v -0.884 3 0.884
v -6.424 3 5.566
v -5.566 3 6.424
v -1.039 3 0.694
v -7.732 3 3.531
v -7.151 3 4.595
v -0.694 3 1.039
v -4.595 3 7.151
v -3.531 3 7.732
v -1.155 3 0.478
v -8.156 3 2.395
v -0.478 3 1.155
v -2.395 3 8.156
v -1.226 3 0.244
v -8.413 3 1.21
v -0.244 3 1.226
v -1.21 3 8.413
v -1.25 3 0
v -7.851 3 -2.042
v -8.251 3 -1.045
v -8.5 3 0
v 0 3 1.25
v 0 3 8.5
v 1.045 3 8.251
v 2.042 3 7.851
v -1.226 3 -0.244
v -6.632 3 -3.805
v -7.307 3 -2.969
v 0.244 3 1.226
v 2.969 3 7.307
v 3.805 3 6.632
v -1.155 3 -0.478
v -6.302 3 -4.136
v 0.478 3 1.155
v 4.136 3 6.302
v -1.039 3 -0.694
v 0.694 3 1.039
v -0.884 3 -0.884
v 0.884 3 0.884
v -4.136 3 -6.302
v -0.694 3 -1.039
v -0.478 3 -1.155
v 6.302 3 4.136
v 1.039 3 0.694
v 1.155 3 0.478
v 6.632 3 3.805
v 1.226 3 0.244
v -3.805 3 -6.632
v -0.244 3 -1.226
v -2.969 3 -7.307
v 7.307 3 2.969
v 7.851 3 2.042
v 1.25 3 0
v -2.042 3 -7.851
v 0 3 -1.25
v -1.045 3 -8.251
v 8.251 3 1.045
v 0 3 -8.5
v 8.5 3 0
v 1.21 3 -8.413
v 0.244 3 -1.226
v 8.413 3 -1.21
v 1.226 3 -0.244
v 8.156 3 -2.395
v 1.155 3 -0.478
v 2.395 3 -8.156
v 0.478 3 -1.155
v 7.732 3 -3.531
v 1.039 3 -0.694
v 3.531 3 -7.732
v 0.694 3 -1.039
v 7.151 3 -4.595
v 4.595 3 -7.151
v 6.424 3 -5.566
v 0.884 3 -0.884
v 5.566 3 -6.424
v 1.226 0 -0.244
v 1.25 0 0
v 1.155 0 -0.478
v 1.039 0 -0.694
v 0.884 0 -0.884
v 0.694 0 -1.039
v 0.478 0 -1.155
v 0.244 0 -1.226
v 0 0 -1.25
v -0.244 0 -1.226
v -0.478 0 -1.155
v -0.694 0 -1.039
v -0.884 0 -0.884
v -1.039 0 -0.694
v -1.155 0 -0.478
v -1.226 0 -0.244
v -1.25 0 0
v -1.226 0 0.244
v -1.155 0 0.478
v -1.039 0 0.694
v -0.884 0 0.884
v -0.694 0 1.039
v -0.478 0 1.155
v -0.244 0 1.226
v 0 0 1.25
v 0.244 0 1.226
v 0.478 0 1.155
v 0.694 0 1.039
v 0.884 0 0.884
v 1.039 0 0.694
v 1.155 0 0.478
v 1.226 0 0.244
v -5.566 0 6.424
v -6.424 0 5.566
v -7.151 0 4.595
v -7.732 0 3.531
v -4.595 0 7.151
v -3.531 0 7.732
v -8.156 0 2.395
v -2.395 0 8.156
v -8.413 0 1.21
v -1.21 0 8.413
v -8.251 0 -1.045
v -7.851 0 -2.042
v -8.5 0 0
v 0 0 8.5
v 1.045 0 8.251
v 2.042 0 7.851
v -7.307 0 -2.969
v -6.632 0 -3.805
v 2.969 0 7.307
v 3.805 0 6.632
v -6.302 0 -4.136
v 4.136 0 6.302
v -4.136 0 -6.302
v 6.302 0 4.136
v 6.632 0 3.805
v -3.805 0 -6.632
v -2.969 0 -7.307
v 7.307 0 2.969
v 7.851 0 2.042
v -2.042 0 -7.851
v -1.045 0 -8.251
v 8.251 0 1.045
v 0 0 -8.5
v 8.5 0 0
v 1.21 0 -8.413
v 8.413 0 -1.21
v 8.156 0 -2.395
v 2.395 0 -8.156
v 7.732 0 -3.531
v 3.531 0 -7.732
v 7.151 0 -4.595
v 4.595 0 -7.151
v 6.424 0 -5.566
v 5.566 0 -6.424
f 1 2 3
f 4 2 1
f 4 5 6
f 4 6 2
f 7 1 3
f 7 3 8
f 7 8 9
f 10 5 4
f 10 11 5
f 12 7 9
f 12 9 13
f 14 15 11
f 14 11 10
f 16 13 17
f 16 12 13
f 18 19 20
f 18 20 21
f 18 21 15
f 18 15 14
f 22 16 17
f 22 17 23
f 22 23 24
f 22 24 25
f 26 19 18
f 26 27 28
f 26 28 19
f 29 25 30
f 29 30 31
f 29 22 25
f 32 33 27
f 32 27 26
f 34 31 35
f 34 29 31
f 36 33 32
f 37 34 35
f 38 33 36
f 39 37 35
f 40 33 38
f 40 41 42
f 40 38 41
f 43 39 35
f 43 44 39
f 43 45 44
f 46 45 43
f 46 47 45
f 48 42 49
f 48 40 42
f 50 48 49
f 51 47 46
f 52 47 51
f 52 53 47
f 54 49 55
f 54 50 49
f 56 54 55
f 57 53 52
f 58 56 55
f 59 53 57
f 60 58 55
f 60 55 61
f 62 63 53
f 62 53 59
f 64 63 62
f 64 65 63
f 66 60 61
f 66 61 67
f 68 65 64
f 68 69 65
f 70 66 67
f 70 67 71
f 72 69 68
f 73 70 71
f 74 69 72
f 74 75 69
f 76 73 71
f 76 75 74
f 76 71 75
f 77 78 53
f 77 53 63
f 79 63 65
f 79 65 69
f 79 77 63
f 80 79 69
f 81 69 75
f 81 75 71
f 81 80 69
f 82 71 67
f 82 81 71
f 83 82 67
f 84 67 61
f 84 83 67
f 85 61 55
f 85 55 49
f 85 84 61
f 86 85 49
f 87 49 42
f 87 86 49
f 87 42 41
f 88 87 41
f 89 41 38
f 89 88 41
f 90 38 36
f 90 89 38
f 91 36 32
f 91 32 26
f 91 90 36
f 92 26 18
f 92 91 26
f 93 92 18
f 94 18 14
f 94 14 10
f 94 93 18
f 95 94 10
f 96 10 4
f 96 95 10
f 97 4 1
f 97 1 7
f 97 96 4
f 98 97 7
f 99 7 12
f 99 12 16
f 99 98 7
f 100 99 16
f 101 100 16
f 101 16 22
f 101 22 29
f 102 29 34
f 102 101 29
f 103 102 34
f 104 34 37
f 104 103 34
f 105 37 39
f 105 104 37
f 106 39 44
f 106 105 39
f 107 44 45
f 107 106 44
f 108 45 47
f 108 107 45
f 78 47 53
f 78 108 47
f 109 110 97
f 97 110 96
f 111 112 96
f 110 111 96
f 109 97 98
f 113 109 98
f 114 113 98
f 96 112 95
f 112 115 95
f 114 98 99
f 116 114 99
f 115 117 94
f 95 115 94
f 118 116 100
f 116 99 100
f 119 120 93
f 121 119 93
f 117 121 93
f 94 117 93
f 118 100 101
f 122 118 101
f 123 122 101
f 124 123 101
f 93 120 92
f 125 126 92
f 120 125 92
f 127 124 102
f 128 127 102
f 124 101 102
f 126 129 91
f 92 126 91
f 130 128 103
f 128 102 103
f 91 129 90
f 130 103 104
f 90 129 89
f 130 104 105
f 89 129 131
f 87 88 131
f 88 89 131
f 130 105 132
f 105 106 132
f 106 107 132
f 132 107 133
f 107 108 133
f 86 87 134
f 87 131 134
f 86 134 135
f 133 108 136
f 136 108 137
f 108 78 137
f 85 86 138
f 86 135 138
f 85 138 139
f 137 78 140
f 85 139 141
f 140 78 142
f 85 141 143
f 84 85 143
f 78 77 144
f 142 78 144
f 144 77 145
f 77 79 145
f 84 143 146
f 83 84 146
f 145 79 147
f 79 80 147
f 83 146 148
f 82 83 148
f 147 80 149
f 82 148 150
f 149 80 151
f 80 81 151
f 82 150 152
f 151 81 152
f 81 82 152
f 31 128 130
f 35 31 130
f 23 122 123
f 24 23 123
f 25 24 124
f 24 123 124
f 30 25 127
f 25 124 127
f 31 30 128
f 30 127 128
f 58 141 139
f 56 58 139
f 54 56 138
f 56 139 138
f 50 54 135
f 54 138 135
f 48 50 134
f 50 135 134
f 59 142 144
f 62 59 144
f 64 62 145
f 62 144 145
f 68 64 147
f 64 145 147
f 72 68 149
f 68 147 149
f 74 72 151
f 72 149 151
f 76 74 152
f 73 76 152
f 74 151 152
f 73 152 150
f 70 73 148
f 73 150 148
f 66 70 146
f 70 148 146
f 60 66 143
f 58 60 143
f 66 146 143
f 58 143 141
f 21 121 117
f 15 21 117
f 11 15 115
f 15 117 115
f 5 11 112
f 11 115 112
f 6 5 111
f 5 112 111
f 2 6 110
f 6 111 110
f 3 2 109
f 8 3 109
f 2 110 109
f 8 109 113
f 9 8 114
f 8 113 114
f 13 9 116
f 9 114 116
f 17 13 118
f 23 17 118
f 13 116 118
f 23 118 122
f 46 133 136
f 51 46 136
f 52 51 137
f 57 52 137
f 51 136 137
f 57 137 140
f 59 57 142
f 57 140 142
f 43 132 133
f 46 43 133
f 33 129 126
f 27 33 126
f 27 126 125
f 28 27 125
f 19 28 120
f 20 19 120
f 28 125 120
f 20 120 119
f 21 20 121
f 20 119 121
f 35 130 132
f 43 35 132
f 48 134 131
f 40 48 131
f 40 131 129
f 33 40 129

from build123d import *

# Parameters (mm, degrees)
SKETCH1_R           = 1.25
BOSS_EXTRUDE1_DEPTH = 3


with BuildPart() as part:
    # Sketch1 → Boss-Extrude1 (new body)
    with BuildSketch(Plane(origin=(0, 0, 0), x_dir=(1, 0, 0), z_dir=(0, 1, 0))):
        with BuildLine():
            Line((6.30223182, -4.135535586), (6.632271605, -3.805495802))
            ThreePointArc((6.632271605, -3.805495802), (7.850711529, -2.042416999), (8.5, 0))
            ThreePointArc((8.5, 0), (6.01040764, 6.01040764), (0, 8.5))
            ThreePointArc((0, 8.5), (-2.042416999, 7.850711529), (-3.805495802, 6.632271605))
            Line((-3.805495802, 6.632271605), (-4.135535586, 6.30223182))
            Line((-4.135535586, 6.30223182), (-6.30223182, 4.135535586))
            Line((-6.30223182, 4.135535586), (-6.632271605, 3.805495802))
            ThreePointArc((-6.632271605, 3.805495802), (-7.850711529, 2.042416999), (-8.5, 0))
            ThreePointArc((-8.5, 0), (-6.01040764, -6.01040764), (0, -8.5))
            ThreePointArc((0, -8.5), (2.042416999, -7.850711529), (3.805495802, -6.632271605))
            Line((3.805495802, -6.632271605), (4.135535586, -6.30223182))
            Line((4.135535586, -6.30223182), (6.30223182, -4.135535586))
        make_face()
        Circle(SKETCH1_R, mode=Mode.SUBTRACT)
    extrude(amount=BOSS_EXTRUDE1_DEPTH)


solid = part.part
